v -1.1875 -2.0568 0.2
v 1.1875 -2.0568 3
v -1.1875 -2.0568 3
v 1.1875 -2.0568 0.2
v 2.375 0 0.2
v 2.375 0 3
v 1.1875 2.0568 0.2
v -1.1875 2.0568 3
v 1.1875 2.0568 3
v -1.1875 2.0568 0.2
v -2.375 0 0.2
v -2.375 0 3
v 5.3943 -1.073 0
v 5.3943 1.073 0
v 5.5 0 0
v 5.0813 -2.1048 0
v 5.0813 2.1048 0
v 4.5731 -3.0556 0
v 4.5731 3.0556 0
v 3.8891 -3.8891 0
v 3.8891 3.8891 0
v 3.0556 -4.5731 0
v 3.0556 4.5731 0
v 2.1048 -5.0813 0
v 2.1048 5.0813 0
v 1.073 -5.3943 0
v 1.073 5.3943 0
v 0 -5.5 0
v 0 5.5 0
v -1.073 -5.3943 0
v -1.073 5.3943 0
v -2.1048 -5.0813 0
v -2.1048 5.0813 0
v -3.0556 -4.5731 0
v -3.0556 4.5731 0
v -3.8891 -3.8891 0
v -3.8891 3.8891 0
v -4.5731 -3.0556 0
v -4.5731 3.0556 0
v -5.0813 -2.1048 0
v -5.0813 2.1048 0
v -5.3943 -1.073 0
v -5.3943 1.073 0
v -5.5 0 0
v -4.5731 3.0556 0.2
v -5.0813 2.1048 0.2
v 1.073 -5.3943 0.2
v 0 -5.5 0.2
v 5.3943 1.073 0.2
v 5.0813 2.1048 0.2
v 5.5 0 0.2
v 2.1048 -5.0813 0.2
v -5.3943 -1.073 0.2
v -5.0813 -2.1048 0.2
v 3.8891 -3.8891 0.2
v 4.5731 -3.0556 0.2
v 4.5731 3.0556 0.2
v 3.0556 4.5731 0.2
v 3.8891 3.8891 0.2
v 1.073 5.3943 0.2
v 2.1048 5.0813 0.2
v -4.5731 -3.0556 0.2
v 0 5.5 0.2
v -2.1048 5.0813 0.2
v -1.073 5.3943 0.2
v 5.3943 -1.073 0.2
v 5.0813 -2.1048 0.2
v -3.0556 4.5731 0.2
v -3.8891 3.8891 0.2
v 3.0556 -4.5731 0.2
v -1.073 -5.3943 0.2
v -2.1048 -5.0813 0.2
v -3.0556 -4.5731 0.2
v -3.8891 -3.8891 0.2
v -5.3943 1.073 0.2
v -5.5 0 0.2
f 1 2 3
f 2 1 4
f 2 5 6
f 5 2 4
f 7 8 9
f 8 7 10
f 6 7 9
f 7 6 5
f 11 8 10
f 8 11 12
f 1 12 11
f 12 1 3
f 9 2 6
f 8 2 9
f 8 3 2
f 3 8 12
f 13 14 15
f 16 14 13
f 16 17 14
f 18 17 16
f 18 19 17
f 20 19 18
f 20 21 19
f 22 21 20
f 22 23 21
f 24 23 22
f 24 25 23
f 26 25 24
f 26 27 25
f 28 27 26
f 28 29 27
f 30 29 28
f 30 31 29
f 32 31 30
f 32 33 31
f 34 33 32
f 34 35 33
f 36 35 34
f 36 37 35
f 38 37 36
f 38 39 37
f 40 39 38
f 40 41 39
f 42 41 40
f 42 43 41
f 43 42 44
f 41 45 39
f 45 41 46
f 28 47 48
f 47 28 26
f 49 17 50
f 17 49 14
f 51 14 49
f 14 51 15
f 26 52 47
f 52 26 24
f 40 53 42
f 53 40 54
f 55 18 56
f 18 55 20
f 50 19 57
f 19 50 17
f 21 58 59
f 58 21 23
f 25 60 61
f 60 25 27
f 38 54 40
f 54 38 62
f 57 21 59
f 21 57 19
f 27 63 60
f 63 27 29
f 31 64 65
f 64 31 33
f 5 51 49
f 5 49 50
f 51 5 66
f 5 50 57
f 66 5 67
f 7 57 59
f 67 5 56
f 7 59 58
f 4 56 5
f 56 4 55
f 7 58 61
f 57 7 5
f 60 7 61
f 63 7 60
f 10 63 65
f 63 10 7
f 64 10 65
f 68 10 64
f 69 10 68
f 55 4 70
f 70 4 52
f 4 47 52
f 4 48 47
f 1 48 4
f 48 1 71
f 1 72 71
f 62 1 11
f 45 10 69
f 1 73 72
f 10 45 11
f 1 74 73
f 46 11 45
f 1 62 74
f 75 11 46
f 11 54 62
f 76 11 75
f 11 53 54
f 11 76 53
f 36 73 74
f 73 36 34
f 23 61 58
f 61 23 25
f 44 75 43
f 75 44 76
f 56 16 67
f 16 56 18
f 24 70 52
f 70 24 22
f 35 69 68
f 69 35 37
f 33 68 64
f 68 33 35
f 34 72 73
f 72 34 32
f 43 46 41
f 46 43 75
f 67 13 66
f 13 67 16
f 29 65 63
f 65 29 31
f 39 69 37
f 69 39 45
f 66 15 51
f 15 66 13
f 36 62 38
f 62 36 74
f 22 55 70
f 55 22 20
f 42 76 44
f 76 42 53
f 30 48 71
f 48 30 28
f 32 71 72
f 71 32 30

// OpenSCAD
$fn=32;

module krytka(priemer = 11, velkost_pin = 4.5, vyska = 2.5) {
    cylinder(h = vyska, d = velkost_pin, $fn = 6);
    cylinder(h = 0.2, d = priemer);
}

translate([0,0,0]) krytka(priemer = 11, velkost_pin = 4.75, vyska = 3);
